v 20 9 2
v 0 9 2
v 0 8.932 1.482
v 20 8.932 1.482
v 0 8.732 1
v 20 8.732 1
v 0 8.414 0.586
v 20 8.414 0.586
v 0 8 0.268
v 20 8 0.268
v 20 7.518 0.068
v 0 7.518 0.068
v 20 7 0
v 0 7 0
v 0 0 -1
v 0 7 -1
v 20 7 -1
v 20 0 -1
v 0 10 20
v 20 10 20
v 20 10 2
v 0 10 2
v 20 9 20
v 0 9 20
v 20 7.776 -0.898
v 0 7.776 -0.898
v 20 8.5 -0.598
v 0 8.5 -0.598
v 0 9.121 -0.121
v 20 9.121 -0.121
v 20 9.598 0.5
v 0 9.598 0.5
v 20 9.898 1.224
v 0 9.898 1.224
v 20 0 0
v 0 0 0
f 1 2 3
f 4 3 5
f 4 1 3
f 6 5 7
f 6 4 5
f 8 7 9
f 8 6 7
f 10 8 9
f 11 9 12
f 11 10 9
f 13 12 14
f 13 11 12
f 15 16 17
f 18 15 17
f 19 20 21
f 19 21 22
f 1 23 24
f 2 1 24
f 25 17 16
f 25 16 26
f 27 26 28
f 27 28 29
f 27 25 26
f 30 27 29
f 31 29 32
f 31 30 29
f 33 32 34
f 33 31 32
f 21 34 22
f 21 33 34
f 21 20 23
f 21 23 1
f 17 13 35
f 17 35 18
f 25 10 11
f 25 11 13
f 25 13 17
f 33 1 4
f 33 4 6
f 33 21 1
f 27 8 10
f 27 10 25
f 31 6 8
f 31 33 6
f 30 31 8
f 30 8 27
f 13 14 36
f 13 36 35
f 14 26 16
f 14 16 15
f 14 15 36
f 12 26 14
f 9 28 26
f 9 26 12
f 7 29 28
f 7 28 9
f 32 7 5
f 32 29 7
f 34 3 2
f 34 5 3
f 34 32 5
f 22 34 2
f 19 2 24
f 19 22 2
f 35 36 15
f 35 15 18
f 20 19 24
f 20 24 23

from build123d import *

# Parameters (mm, degrees)
SKETCH_1_W                 = 20
SKETCH_1_H                 = 10
BASEPLATE_DEPTH            = 1
EDGEFLANGE_STRIP_W         = 8
EDGEFLANGE_STRIP_H         = 1
EDGEFLANGE_STRIP_CUT_DEPTH = 20
EDGEFLANGE_DEPTH           = 20
EDGEFLANGE_FLAT_DEPTH      = 1


# Sheet-metal steps are written as plain solids
with BuildPart() as part:
    # Sketch 1 → BasePlate (new body)
    with BuildSketch(Plane.XY):
        with Locations((10, 5)):
            Rectangle(SKETCH_1_W, SKETCH_1_H)
    extrude(amount=-BASEPLATE_DEPTH)

    # EdgeFlange strip (across the edge) → EdgeFlange strip cut (cut)
    with BuildSketch(Plane(origin=(20, 10, 0), x_dir=(0, -1, 0), z_dir=(-1, 0, 0))):
        with Locations((-1, -0.5)):
            Rectangle(EDGEFLANGE_STRIP_W, EDGEFLANGE_STRIP_H)
    extrude(amount=EDGEFLANGE_STRIP_CUT_DEPTH, mode=Mode.SUBTRACT)

    # EdgeFlange bend section (across the edge) → EdgeFlange (add)
    with BuildSketch(Plane(origin=(20, 10, 0), x_dir=(0, -1, 0), z_dir=(-1, 0, 0))):
        with BuildLine():
            Line((0, 2), (1, 2))
            ThreePointArc((1, 2), (1.585786438, 0.585786438), (3, 0))
            Line((3, 0), (3, -1))
            ThreePointArc((3, -1), (0.878679656, -0.121320344), (0, 2))
        make_face()
    extrude(amount=EDGEFLANGE_DEPTH)

    # EdgeFlange profile (on flange) → EdgeFlange flat (add)
    with BuildSketch(Plane(origin=(0, 10, 0), x_dir=(-1, 0, 0), z_dir=(0, 1, 0))):
        Polygon((-20, 20), (-20, 2), (0, 2), (0, 20), (-2, 20), (-18, 20), align=None)
    extrude(amount=-EDGEFLANGE_FLAT_DEPTH)


solid = part.part
